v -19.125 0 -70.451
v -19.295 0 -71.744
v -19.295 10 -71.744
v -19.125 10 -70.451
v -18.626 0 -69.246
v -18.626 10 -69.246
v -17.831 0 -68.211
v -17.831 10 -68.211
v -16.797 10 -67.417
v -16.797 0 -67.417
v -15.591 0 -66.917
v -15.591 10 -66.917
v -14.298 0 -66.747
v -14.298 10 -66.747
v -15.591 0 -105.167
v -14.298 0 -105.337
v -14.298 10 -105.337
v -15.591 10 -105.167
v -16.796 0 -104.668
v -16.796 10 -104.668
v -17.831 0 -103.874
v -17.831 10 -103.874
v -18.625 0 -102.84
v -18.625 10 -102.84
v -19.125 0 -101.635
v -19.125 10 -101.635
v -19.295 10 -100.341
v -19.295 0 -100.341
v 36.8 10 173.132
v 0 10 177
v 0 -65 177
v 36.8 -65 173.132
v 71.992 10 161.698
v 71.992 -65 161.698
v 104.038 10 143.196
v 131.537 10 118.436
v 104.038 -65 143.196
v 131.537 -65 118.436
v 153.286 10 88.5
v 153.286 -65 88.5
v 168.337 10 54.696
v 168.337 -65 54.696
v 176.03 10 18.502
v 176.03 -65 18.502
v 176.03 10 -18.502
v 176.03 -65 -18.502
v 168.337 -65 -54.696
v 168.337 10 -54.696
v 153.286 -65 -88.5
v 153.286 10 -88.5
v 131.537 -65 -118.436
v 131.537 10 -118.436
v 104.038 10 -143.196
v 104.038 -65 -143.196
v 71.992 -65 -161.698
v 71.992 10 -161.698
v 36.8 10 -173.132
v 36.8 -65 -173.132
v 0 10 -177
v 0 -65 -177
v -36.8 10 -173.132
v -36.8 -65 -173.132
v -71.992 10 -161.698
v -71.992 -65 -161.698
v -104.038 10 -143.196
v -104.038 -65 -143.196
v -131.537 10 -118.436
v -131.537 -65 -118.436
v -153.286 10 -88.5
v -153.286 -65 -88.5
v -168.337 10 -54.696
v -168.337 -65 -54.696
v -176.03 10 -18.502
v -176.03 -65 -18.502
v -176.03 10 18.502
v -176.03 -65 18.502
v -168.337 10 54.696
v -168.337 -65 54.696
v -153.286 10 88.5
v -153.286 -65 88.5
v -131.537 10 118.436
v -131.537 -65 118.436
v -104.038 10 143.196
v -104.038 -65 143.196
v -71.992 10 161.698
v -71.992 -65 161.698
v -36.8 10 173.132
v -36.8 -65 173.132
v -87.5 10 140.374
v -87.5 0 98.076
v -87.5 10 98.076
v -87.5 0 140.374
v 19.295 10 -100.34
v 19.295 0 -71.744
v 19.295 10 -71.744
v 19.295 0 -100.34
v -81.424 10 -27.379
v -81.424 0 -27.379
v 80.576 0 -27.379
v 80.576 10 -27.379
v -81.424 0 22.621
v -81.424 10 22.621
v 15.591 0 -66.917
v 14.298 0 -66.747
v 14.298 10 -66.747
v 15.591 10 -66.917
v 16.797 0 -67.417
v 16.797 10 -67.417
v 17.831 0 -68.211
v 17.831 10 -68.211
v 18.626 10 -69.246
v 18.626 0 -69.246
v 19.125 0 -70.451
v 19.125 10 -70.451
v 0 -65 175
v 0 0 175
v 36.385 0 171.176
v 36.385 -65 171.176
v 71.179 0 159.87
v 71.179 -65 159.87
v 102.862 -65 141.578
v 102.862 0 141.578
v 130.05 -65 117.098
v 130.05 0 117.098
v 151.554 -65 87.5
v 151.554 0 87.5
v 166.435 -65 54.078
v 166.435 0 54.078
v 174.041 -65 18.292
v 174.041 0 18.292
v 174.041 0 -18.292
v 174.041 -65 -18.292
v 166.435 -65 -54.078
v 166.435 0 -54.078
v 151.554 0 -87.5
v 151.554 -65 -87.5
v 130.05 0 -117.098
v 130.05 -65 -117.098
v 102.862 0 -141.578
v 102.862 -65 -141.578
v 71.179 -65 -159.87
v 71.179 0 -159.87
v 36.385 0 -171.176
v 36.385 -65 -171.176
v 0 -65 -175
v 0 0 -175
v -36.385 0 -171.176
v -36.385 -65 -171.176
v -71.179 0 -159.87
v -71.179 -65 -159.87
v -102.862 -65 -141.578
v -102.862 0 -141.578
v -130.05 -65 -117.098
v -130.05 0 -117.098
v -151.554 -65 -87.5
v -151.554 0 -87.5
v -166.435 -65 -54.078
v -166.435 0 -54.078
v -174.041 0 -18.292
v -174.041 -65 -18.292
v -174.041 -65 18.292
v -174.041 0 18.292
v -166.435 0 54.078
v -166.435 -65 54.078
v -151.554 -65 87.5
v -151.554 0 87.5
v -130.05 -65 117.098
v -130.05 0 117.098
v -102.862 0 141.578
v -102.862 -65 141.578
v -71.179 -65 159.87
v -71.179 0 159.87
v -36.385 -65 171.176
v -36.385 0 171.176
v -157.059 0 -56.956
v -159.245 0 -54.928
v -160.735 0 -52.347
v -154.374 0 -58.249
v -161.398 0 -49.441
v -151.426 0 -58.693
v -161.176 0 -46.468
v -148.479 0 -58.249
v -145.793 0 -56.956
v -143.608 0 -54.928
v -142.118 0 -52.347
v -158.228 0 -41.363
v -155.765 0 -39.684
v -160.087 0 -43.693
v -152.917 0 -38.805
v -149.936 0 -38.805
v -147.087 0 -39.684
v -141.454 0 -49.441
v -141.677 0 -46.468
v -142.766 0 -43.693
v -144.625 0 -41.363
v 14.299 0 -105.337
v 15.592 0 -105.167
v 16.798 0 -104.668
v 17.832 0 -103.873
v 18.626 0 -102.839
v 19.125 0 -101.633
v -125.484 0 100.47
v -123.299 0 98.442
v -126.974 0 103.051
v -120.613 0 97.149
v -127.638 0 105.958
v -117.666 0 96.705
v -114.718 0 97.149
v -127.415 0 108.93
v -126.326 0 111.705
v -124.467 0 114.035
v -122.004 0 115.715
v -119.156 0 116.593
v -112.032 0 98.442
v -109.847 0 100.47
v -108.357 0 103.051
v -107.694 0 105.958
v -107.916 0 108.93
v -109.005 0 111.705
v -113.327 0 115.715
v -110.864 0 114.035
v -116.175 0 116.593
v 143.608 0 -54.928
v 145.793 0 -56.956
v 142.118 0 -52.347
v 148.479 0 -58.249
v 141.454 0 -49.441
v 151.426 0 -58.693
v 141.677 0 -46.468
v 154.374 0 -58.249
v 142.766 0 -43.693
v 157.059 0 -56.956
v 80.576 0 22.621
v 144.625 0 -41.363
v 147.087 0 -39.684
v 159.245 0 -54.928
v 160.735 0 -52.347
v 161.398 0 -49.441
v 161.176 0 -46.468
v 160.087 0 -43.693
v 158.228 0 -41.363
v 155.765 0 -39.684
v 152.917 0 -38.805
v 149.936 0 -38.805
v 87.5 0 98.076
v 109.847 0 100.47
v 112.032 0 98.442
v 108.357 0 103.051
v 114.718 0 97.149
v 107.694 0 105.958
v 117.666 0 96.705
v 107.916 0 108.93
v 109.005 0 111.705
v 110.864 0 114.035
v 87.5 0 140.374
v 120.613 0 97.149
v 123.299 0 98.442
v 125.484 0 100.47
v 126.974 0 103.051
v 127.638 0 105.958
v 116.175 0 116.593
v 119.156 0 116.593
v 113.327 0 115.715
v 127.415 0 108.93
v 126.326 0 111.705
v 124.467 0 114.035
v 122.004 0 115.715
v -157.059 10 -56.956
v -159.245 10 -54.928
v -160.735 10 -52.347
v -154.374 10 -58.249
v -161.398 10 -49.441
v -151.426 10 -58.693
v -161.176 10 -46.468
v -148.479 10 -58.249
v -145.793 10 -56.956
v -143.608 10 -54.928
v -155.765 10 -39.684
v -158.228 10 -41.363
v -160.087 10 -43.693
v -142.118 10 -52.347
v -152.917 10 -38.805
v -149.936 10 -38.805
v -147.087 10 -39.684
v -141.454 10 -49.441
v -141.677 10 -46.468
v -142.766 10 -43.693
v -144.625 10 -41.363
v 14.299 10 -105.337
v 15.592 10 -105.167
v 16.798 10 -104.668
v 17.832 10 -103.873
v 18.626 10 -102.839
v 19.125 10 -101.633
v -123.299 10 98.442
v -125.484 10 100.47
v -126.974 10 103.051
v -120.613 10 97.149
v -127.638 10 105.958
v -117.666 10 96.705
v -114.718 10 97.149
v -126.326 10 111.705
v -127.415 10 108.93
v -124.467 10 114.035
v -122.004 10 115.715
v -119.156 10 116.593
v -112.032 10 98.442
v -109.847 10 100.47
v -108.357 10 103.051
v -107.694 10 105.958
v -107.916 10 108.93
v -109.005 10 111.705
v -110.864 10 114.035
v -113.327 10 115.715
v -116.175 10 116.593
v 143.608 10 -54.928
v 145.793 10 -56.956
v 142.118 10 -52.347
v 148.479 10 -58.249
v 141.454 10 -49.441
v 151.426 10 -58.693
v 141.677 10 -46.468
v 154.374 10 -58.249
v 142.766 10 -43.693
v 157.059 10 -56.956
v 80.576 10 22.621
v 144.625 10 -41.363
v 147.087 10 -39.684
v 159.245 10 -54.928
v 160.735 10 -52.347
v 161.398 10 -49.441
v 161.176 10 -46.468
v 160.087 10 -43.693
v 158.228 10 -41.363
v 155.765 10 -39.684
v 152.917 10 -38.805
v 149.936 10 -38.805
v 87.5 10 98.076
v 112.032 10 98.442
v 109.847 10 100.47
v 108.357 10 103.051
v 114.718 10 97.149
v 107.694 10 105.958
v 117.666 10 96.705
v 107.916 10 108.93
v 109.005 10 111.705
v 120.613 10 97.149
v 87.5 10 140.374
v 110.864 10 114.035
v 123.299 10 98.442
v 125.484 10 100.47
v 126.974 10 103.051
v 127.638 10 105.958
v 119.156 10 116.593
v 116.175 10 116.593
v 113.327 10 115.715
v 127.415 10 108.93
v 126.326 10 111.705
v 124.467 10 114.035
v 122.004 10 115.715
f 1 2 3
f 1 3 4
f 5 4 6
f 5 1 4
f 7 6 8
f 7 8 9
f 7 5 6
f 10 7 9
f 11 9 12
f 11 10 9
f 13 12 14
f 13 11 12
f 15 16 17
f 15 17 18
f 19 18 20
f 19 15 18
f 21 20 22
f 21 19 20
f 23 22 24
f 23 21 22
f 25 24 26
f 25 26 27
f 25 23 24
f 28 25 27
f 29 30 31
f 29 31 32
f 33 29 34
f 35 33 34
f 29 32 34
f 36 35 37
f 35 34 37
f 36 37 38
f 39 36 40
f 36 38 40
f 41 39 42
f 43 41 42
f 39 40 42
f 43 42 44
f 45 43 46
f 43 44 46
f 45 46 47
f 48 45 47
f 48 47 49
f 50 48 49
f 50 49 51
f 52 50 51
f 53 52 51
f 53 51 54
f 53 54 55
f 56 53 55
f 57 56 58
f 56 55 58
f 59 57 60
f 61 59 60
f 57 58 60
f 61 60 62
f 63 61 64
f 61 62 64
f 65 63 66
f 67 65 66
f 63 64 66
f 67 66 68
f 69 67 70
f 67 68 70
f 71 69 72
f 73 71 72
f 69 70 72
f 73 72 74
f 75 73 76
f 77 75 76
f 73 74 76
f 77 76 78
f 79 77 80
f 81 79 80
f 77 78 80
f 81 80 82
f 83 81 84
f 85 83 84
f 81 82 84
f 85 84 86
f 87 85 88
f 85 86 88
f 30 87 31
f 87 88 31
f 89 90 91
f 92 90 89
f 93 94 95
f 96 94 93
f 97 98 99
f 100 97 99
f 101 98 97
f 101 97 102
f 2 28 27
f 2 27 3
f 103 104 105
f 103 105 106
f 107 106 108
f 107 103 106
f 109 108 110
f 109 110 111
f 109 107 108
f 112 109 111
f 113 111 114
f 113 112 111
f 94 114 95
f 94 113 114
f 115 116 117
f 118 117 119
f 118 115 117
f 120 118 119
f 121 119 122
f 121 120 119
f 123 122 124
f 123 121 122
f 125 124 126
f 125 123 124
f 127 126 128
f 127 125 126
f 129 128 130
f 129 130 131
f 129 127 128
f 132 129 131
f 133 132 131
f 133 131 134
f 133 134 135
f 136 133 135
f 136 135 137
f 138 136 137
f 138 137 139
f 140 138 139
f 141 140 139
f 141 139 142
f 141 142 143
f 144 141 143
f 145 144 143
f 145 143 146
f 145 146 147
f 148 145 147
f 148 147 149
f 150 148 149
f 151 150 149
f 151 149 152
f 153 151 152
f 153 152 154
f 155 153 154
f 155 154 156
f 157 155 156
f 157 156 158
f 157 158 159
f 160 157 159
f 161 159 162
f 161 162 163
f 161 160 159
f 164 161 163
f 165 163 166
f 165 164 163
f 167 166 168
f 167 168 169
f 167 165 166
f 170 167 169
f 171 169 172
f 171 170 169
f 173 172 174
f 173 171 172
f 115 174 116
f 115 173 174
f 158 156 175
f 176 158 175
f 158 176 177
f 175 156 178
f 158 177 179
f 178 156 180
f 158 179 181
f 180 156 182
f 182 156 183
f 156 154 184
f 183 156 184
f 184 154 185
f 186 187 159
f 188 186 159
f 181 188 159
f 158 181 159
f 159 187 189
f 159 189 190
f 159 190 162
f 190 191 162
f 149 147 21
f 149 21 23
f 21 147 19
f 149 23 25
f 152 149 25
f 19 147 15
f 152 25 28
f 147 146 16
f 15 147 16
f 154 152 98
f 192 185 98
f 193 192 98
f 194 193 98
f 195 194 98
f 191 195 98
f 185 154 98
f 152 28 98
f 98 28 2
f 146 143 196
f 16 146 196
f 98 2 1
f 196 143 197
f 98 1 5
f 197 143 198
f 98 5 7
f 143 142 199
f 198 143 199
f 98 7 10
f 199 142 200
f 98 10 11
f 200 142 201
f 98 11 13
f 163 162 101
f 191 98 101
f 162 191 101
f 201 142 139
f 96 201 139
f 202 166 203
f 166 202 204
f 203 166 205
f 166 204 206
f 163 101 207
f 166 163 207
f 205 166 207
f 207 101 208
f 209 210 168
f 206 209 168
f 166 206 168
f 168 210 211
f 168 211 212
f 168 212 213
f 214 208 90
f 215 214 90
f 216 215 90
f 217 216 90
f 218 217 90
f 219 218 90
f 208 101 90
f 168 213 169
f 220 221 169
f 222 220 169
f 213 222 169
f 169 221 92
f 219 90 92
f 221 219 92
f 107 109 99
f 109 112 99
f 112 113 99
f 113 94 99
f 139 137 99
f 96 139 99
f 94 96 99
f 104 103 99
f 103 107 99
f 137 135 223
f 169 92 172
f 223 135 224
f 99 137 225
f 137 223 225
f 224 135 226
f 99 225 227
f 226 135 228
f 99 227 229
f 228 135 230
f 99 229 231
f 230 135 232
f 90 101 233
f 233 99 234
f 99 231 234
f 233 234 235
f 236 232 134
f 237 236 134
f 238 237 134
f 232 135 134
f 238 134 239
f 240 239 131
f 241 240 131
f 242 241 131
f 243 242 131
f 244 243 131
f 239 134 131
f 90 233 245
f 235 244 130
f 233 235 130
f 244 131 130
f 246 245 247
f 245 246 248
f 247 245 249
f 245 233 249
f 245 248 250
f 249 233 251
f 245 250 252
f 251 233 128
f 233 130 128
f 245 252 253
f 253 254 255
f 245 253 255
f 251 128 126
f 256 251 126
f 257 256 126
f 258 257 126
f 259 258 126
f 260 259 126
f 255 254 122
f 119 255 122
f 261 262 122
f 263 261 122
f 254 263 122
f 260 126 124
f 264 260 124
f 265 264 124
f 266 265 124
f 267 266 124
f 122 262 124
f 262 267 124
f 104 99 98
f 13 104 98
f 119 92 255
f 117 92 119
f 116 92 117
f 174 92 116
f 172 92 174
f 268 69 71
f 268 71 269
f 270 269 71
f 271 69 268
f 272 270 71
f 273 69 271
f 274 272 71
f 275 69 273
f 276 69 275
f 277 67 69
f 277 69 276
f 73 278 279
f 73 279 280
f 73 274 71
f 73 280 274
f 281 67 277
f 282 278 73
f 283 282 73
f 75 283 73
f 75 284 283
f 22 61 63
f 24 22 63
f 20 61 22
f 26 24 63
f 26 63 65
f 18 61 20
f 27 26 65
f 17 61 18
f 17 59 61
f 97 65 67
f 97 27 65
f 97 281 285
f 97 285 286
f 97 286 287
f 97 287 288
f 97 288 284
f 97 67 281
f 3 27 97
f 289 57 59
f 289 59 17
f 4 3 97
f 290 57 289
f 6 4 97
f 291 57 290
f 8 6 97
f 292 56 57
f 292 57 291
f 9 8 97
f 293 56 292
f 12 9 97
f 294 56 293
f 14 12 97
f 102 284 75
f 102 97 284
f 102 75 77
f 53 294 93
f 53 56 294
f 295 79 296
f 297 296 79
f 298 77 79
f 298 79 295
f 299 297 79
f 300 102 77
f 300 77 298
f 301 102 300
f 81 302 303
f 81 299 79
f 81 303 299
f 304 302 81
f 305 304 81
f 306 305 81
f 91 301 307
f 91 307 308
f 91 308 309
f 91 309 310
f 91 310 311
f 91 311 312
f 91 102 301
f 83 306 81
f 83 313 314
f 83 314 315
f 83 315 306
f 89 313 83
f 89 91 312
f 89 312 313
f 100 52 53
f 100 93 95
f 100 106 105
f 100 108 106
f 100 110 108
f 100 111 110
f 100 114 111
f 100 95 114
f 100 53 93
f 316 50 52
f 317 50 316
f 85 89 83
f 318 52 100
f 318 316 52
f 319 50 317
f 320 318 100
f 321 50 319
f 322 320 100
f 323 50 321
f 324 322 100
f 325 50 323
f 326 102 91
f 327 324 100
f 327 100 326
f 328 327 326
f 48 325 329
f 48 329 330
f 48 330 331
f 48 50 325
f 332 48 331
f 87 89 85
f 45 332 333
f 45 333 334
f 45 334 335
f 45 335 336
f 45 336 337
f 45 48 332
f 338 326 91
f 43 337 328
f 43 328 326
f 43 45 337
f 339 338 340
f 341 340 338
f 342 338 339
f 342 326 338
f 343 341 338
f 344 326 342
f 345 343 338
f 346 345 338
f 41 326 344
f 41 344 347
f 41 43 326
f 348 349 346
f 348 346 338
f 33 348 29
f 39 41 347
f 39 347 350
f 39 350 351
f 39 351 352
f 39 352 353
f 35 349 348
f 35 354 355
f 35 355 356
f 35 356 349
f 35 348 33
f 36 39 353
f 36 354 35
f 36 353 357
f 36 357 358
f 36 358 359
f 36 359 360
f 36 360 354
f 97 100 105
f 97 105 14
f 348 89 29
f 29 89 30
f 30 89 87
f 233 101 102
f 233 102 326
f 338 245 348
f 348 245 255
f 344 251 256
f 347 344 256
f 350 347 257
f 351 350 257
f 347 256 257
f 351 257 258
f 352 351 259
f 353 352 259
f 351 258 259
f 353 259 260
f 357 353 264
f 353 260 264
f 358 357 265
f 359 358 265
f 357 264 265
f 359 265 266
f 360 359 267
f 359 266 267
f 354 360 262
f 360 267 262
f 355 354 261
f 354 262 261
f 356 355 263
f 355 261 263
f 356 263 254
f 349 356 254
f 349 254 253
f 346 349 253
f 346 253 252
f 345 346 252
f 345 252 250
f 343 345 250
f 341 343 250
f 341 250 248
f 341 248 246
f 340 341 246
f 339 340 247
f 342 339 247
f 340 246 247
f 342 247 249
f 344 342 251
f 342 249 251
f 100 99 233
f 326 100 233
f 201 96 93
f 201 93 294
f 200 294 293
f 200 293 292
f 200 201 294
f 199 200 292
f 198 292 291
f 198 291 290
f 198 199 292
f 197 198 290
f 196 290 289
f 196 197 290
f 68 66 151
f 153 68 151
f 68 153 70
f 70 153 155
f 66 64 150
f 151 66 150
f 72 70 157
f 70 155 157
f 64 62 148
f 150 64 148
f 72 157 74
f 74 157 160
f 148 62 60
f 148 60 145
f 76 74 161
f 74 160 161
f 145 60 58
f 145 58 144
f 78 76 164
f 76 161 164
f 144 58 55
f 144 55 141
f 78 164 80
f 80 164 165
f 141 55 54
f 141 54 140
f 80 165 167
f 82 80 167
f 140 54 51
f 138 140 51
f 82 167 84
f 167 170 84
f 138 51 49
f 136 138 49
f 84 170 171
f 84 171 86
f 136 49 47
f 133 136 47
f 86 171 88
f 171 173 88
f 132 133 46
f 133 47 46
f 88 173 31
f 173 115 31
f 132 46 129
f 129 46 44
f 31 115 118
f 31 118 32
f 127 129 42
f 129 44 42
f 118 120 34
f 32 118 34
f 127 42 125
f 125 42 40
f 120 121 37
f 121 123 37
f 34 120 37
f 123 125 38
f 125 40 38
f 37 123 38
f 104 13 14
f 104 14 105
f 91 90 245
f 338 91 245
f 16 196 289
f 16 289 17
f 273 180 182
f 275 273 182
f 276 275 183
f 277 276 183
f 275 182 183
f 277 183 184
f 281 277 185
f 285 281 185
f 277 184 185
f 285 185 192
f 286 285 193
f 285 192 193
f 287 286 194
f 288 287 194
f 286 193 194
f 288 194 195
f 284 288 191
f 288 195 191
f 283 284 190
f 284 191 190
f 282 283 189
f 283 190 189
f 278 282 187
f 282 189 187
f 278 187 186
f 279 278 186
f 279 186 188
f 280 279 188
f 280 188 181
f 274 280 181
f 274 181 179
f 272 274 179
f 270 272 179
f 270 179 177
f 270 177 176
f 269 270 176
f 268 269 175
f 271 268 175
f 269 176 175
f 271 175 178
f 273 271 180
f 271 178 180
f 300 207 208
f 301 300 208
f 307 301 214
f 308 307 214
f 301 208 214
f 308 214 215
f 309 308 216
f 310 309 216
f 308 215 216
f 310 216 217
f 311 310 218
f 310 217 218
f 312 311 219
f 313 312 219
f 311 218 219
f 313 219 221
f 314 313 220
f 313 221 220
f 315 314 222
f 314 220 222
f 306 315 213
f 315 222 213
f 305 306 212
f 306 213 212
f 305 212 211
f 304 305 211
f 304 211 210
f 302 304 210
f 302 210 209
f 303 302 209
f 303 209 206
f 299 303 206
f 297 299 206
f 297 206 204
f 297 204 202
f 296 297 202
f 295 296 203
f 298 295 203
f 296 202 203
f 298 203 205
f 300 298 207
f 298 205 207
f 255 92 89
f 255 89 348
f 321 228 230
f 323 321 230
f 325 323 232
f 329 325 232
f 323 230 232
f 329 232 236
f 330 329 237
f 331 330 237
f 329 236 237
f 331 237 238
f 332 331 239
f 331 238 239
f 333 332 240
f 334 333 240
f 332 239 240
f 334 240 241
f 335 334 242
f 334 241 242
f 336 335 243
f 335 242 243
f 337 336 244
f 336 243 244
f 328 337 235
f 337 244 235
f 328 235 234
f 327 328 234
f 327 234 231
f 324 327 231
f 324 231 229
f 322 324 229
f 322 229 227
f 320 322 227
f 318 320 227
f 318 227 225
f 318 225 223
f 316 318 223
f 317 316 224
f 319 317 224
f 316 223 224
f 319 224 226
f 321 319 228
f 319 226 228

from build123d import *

# Parameters (mm, degrees)
SKETCH1_R           = 175
BOSS_EXTRUDE1_DEPTH = 10
SKETCH3_R           = 10
SKETCH3_W           = 162
SKETCH3_H           = 50
SKETCH3_W_2         = 175
SKETCH3_H_2         = 42.297309852
CUT_EXTRUDE2_DEPTH  = 10
CUT_EXTRUDE3_DEPTH  = 10
BOSS_EXTRUDE2_START = -75
SKETCH5_R           = 177
SKETCH5_R_2         = 175
BOSS_EXTRUDE2_DEPTH = 75


with BuildPart() as part:
    # Sketch1 → Boss-Extrude1 (new body)
    with BuildSketch(Plane(origin=(0, 0, 0), x_dir=(1, 0, 0), z_dir=(0, 1, 0))):
        with Locations(Location((0, 0, 0), (0, 0, 270))):
            Circle(SKETCH1_R)
    extrude(amount=BOSS_EXTRUDE1_DEPTH)

    # Sketch3 → Cut-Extrude2 (cut)
    with BuildSketch(Plane.XZ):
        with Locations(Location((-117.665653332, 106.704862813, 0), (0, 0, 270))):
            Circle(SKETCH3_R)
        with Locations(Location((117.665653332, 106.704862813, 0), (0, 0, 270))):
            Circle(SKETCH3_R)
        with Locations(Location((151.426262726, -48.693236313, 0), (0, 0, 270))):
            Circle(SKETCH3_R)
        with Locations(Location((-151.426262726, -48.693236313, 0), (0, 0, 270))):
            Circle(SKETCH3_R)
        with Locations((-0.423800225, -2.37885536)):
            Rectangle(SKETCH3_W, SKETCH3_H)
        with Locations((0, 119.225084577)):
            Rectangle(SKETCH3_W_2, SKETCH3_H_2)
    extrude(amount=-CUT_EXTRUDE2_DEPTH, mode=Mode.SUBTRACT)

    # Sketch4 → Cut-Extrude3 (cut)
    with BuildSketch(Plane.XZ):
        with BuildLine():
            Line((-14.298045865, -66.747113031), (14.298045865, -66.747113031))
            ThreePointArc((14.298045865, -66.747113031), (17.831426019, -68.210687012), (19.295, -71.744067166))
            Line((19.295, -71.744067166), (19.295, -100.340158896))
            ThreePointArc((19.295, -100.340158896), (17.832240237, -103.873462582), (14.299305419, -105.337113031))
            Line((14.299305419, -105.337113031), (-14.298045712, -105.337113031))
            ThreePointArc((-14.298045712, -105.337113031), (-17.831350955, -103.874338314), (-19.295, -100.341395166))
            Line((-19.295, -100.341395166), (-19.295, -71.744067166))
            ThreePointArc((-19.295, -71.744067166), (-17.831426019, -68.210687012), (-14.298045865, -66.747113031))
        make_face()
    extrude(amount=-CUT_EXTRUDE3_DEPTH, mode=Mode.SUBTRACT)

    # Sketch5 → Boss-Extrude2 (add)
    with BuildSketch(Plane(origin=(0, 10, 0), x_dir=(1, 0, 0), z_dir=(0, 1, 0)).offset(BOSS_EXTRUDE2_START)):
        with Locations(Location((0, 0, 0), (0, 0, 270))):
            Circle(SKETCH5_R)
        with Locations(Location((0, 0, 0), (0, 0, 270))):
            Circle(SKETCH5_R_2, mode=Mode.SUBTRACT)
    extrude(amount=BOSS_EXTRUDE2_DEPTH)


solid = part.part
